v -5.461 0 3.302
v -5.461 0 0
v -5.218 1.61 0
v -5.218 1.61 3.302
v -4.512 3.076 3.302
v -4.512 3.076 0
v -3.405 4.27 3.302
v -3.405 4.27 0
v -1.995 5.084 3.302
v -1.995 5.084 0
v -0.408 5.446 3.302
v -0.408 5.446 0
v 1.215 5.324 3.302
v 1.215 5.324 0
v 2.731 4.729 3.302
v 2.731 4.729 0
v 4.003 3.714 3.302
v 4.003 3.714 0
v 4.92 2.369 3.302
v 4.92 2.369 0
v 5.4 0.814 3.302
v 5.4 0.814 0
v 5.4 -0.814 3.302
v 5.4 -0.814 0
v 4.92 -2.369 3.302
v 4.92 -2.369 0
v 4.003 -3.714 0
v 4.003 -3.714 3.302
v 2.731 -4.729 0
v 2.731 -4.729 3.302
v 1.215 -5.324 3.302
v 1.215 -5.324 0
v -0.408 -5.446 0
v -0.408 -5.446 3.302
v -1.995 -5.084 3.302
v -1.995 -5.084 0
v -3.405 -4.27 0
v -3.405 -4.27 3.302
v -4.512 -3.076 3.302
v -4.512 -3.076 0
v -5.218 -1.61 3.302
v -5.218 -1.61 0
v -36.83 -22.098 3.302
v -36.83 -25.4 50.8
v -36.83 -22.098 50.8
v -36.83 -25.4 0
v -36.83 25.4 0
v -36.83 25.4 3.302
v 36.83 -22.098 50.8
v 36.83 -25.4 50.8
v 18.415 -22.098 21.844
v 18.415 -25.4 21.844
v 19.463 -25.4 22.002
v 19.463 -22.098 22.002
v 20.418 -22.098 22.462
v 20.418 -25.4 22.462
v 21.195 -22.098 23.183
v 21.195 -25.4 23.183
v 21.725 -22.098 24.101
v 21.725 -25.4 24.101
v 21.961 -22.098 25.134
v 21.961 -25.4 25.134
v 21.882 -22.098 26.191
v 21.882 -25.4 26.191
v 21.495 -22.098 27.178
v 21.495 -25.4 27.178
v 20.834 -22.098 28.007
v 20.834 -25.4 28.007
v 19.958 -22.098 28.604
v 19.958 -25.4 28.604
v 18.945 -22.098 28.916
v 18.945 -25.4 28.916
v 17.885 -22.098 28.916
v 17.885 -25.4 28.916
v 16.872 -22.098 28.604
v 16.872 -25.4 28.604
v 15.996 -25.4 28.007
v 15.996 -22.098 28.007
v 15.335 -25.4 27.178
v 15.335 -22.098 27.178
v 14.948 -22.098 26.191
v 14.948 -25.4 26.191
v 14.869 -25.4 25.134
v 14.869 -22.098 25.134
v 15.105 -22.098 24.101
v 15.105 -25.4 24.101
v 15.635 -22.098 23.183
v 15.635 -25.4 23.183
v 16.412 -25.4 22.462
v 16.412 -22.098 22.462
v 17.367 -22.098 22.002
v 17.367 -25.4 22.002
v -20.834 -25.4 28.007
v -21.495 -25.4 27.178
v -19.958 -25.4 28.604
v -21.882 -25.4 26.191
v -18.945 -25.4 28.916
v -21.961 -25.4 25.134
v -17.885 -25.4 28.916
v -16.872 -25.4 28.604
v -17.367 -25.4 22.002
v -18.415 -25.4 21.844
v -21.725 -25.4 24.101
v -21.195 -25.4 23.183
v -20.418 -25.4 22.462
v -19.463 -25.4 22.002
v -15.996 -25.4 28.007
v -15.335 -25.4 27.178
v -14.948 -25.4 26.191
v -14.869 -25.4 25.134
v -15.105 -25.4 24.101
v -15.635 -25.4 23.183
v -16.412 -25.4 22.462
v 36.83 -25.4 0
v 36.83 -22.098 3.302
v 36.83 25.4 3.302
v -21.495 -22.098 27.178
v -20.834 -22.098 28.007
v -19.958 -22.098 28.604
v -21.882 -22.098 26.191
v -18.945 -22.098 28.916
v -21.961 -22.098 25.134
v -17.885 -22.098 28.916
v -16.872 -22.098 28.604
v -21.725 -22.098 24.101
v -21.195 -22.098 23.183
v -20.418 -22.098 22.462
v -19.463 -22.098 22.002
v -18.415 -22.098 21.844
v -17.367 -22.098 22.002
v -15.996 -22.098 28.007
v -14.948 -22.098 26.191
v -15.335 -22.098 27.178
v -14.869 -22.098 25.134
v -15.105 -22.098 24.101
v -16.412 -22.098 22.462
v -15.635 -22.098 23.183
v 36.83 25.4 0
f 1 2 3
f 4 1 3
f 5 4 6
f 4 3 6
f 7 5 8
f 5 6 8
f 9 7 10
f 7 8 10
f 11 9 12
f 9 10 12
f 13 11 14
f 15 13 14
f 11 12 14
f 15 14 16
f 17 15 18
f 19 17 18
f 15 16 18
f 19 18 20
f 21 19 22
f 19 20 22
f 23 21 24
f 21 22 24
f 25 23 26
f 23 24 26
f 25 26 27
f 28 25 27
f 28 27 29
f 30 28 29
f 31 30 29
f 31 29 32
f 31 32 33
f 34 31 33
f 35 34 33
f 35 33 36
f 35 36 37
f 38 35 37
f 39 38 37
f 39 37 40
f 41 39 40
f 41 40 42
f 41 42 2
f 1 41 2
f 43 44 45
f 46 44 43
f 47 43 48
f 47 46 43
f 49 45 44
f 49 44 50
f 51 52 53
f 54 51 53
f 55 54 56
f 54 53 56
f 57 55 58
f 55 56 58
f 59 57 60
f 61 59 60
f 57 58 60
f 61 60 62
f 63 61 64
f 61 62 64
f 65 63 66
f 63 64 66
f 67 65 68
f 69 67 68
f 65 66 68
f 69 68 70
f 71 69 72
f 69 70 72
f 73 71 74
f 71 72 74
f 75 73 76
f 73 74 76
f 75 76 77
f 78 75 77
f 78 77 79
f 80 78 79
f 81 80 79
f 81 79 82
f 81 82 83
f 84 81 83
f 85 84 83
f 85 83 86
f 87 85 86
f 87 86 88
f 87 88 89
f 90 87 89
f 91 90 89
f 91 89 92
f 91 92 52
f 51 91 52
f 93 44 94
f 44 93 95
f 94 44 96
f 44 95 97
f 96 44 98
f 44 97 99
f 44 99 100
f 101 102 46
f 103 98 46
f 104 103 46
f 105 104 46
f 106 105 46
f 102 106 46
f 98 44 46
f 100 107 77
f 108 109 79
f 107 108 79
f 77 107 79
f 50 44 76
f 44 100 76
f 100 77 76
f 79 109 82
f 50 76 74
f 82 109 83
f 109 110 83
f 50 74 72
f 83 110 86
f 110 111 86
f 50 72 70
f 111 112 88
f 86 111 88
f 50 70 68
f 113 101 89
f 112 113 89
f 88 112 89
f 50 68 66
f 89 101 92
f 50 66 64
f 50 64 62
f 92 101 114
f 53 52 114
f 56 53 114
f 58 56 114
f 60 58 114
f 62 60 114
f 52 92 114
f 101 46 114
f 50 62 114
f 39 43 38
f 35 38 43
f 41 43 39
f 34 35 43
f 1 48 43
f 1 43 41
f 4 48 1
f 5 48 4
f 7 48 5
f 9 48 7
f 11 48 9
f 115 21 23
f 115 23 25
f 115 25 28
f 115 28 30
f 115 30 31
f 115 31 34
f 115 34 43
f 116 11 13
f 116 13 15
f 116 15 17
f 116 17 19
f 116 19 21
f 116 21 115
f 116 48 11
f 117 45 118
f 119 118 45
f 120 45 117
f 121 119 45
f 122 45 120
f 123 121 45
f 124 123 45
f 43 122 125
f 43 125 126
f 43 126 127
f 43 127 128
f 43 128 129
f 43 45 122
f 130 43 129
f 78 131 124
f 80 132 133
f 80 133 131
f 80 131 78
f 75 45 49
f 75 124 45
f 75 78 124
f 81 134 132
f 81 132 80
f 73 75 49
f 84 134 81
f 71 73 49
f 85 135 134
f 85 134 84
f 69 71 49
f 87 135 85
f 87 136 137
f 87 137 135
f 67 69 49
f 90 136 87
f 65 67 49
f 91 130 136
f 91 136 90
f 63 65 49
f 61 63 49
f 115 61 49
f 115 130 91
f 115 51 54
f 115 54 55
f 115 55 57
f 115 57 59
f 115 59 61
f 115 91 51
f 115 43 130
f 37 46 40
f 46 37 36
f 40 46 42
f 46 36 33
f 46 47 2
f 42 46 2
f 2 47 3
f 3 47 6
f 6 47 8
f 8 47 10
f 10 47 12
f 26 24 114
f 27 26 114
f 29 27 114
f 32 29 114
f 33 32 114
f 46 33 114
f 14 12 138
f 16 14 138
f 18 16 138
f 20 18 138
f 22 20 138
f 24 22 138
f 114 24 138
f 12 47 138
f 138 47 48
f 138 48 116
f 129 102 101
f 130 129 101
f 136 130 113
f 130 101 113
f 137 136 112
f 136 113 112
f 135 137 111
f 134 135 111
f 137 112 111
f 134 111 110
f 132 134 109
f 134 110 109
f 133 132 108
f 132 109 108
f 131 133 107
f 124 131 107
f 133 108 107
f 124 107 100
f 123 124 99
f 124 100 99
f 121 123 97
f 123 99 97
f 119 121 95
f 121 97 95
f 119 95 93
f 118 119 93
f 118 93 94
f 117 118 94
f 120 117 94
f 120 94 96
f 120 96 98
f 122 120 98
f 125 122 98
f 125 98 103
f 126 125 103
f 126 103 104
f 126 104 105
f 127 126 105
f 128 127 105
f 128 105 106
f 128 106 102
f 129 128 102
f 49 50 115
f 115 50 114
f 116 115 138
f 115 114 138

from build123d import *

# Parameters (mm, degrees)
SKETCH1_W           = 73.66
SKETCH1_H           = 50.8
BOSS_EXTRUDE2_DEPTH = 3.302
SKETCH4_W           = 73.66
SKETCH4_H           = 3.302
BOSS_EXTRUDE3_DEPTH = 47.498
SKETCH5_R           = 5.461
CUT_EXTRUDE2_DEPTH  = 68.692310494
SKETCH8_R           = 3.556
CUT_EXTRUDE3_DEPTH  = 81.732452583


with BuildPart() as part:
    # Sketch1 → Boss-Extrude2 (new body)
    with BuildSketch(Plane.XY):
        Rectangle(SKETCH1_W, SKETCH1_H)
    extrude(amount=BOSS_EXTRUDE2_DEPTH)

    # Sketch4 → Boss-Extrude3 (add)
    with BuildSketch(Plane.XY.offset(3.302)):
        with Locations((0, -23.749)):
            Rectangle(SKETCH4_W, SKETCH4_H)
    extrude(amount=BOSS_EXTRUDE3_DEPTH)

    # Sketch5 → Cut-Extrude2 (cut, through all)
    with BuildSketch(Plane(origin=(0, 0, 0), x_dir=(-1, 0, 0), z_dir=(0, 0, -1))):
        Circle(SKETCH5_R)
    extrude(amount=-CUT_EXTRUDE2_DEPTH, mode=Mode.SUBTRACT)

    # Sketch8 → Cut-Extrude3 (cut, through all)
    with BuildSketch(Plane.XZ.offset(25.4)):
        with Locations(Location((-18.415, 25.4, 0), (0, 0, 270))):
            Circle(SKETCH8_R)
        with Locations(Location((18.415, 25.4, 0), (0, 0, 270))):
            Circle(SKETCH8_R)
    extrude(amount=-CUT_EXTRUDE3_DEPTH, mode=Mode.SUBTRACT)


solid = part.part
